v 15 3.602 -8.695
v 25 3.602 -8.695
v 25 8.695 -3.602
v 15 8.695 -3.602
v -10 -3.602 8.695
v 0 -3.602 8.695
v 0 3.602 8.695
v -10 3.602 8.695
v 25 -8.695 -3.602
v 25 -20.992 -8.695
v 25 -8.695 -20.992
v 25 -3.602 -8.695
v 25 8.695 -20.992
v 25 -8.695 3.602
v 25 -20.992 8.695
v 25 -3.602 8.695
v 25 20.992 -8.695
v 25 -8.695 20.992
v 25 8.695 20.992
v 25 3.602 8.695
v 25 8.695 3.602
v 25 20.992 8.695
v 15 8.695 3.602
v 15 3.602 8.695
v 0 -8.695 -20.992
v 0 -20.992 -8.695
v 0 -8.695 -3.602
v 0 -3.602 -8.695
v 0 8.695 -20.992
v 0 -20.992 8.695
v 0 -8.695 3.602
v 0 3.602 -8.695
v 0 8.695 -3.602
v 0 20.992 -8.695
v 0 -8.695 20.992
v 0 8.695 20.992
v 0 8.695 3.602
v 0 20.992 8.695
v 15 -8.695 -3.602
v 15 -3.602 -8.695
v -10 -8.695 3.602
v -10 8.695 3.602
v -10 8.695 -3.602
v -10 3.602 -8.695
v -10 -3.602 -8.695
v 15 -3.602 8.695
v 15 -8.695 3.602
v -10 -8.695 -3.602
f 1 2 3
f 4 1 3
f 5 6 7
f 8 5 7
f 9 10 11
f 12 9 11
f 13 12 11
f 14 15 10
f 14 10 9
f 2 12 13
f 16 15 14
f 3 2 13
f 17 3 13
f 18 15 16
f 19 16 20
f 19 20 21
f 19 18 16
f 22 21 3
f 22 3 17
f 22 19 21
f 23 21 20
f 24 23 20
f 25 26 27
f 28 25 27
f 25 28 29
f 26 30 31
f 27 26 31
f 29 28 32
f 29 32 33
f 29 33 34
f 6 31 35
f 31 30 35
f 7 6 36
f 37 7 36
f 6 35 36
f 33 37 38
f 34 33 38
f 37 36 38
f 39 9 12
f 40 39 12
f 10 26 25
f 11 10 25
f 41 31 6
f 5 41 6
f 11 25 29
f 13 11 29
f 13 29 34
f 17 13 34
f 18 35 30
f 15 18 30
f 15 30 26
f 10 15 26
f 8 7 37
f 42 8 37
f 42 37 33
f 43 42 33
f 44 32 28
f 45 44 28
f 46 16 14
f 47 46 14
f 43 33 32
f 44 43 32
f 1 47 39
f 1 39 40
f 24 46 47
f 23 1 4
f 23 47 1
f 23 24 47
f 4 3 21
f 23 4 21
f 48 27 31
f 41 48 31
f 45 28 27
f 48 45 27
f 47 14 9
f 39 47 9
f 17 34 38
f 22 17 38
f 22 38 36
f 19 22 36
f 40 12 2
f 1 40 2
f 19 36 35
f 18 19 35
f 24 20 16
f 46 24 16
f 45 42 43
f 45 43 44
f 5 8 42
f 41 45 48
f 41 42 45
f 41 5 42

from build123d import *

# Parameters (mm, degrees)
F1_DEPTH = 25
F3_DEPTH = 10
F5_DEPTH = 10


with BuildPart() as f1:
    # F0 (on Right) → F1 (new body)
    with BuildSketch(Plane.YZ):
        Polygon((8.695065, -20.991743), (20.991743, -8.695065), (20.991743, 8.695065), (8.695065, 20.991743), (-8.695065, 20.991743), (-20.991743, 8.695065), (-20.991743, -8.695065), (-8.695065, -20.991743), align=None)
    extrude(amount=F1_DEPTH)

    # F2 (on face) → F3 (join)
    with BuildSketch(Plane(origin=(0, 0, 0), x_dir=(0, -1, 0), z_dir=(-1, 0, 0))):
        Polygon((-3.601614, 8.695065), (-8.695065, 3.601614), (-8.695065, -3.601614), (-3.601614, -8.695065), (3.601614, -8.695065), (8.695065, -3.601614), (8.695065, 3.601614), (3.601614, 8.695065), align=None)
    extrude(amount=F3_DEPTH)

    # F4 (on face) → F5 (cut)
    with BuildSketch(Plane.YZ.offset(25)):
        Polygon((-3.601614, 8.695065), (-8.695065, 3.601614), (-8.695065, -3.601614), (-3.601614, -8.695065), (3.601614, -8.695065), (8.695065, -3.601614), (8.695065, 3.601614), (3.601614, 8.695065), align=None)
    extrude(amount=-F5_DEPTH, mode=Mode.SUBTRACT)


solid = f1.part
